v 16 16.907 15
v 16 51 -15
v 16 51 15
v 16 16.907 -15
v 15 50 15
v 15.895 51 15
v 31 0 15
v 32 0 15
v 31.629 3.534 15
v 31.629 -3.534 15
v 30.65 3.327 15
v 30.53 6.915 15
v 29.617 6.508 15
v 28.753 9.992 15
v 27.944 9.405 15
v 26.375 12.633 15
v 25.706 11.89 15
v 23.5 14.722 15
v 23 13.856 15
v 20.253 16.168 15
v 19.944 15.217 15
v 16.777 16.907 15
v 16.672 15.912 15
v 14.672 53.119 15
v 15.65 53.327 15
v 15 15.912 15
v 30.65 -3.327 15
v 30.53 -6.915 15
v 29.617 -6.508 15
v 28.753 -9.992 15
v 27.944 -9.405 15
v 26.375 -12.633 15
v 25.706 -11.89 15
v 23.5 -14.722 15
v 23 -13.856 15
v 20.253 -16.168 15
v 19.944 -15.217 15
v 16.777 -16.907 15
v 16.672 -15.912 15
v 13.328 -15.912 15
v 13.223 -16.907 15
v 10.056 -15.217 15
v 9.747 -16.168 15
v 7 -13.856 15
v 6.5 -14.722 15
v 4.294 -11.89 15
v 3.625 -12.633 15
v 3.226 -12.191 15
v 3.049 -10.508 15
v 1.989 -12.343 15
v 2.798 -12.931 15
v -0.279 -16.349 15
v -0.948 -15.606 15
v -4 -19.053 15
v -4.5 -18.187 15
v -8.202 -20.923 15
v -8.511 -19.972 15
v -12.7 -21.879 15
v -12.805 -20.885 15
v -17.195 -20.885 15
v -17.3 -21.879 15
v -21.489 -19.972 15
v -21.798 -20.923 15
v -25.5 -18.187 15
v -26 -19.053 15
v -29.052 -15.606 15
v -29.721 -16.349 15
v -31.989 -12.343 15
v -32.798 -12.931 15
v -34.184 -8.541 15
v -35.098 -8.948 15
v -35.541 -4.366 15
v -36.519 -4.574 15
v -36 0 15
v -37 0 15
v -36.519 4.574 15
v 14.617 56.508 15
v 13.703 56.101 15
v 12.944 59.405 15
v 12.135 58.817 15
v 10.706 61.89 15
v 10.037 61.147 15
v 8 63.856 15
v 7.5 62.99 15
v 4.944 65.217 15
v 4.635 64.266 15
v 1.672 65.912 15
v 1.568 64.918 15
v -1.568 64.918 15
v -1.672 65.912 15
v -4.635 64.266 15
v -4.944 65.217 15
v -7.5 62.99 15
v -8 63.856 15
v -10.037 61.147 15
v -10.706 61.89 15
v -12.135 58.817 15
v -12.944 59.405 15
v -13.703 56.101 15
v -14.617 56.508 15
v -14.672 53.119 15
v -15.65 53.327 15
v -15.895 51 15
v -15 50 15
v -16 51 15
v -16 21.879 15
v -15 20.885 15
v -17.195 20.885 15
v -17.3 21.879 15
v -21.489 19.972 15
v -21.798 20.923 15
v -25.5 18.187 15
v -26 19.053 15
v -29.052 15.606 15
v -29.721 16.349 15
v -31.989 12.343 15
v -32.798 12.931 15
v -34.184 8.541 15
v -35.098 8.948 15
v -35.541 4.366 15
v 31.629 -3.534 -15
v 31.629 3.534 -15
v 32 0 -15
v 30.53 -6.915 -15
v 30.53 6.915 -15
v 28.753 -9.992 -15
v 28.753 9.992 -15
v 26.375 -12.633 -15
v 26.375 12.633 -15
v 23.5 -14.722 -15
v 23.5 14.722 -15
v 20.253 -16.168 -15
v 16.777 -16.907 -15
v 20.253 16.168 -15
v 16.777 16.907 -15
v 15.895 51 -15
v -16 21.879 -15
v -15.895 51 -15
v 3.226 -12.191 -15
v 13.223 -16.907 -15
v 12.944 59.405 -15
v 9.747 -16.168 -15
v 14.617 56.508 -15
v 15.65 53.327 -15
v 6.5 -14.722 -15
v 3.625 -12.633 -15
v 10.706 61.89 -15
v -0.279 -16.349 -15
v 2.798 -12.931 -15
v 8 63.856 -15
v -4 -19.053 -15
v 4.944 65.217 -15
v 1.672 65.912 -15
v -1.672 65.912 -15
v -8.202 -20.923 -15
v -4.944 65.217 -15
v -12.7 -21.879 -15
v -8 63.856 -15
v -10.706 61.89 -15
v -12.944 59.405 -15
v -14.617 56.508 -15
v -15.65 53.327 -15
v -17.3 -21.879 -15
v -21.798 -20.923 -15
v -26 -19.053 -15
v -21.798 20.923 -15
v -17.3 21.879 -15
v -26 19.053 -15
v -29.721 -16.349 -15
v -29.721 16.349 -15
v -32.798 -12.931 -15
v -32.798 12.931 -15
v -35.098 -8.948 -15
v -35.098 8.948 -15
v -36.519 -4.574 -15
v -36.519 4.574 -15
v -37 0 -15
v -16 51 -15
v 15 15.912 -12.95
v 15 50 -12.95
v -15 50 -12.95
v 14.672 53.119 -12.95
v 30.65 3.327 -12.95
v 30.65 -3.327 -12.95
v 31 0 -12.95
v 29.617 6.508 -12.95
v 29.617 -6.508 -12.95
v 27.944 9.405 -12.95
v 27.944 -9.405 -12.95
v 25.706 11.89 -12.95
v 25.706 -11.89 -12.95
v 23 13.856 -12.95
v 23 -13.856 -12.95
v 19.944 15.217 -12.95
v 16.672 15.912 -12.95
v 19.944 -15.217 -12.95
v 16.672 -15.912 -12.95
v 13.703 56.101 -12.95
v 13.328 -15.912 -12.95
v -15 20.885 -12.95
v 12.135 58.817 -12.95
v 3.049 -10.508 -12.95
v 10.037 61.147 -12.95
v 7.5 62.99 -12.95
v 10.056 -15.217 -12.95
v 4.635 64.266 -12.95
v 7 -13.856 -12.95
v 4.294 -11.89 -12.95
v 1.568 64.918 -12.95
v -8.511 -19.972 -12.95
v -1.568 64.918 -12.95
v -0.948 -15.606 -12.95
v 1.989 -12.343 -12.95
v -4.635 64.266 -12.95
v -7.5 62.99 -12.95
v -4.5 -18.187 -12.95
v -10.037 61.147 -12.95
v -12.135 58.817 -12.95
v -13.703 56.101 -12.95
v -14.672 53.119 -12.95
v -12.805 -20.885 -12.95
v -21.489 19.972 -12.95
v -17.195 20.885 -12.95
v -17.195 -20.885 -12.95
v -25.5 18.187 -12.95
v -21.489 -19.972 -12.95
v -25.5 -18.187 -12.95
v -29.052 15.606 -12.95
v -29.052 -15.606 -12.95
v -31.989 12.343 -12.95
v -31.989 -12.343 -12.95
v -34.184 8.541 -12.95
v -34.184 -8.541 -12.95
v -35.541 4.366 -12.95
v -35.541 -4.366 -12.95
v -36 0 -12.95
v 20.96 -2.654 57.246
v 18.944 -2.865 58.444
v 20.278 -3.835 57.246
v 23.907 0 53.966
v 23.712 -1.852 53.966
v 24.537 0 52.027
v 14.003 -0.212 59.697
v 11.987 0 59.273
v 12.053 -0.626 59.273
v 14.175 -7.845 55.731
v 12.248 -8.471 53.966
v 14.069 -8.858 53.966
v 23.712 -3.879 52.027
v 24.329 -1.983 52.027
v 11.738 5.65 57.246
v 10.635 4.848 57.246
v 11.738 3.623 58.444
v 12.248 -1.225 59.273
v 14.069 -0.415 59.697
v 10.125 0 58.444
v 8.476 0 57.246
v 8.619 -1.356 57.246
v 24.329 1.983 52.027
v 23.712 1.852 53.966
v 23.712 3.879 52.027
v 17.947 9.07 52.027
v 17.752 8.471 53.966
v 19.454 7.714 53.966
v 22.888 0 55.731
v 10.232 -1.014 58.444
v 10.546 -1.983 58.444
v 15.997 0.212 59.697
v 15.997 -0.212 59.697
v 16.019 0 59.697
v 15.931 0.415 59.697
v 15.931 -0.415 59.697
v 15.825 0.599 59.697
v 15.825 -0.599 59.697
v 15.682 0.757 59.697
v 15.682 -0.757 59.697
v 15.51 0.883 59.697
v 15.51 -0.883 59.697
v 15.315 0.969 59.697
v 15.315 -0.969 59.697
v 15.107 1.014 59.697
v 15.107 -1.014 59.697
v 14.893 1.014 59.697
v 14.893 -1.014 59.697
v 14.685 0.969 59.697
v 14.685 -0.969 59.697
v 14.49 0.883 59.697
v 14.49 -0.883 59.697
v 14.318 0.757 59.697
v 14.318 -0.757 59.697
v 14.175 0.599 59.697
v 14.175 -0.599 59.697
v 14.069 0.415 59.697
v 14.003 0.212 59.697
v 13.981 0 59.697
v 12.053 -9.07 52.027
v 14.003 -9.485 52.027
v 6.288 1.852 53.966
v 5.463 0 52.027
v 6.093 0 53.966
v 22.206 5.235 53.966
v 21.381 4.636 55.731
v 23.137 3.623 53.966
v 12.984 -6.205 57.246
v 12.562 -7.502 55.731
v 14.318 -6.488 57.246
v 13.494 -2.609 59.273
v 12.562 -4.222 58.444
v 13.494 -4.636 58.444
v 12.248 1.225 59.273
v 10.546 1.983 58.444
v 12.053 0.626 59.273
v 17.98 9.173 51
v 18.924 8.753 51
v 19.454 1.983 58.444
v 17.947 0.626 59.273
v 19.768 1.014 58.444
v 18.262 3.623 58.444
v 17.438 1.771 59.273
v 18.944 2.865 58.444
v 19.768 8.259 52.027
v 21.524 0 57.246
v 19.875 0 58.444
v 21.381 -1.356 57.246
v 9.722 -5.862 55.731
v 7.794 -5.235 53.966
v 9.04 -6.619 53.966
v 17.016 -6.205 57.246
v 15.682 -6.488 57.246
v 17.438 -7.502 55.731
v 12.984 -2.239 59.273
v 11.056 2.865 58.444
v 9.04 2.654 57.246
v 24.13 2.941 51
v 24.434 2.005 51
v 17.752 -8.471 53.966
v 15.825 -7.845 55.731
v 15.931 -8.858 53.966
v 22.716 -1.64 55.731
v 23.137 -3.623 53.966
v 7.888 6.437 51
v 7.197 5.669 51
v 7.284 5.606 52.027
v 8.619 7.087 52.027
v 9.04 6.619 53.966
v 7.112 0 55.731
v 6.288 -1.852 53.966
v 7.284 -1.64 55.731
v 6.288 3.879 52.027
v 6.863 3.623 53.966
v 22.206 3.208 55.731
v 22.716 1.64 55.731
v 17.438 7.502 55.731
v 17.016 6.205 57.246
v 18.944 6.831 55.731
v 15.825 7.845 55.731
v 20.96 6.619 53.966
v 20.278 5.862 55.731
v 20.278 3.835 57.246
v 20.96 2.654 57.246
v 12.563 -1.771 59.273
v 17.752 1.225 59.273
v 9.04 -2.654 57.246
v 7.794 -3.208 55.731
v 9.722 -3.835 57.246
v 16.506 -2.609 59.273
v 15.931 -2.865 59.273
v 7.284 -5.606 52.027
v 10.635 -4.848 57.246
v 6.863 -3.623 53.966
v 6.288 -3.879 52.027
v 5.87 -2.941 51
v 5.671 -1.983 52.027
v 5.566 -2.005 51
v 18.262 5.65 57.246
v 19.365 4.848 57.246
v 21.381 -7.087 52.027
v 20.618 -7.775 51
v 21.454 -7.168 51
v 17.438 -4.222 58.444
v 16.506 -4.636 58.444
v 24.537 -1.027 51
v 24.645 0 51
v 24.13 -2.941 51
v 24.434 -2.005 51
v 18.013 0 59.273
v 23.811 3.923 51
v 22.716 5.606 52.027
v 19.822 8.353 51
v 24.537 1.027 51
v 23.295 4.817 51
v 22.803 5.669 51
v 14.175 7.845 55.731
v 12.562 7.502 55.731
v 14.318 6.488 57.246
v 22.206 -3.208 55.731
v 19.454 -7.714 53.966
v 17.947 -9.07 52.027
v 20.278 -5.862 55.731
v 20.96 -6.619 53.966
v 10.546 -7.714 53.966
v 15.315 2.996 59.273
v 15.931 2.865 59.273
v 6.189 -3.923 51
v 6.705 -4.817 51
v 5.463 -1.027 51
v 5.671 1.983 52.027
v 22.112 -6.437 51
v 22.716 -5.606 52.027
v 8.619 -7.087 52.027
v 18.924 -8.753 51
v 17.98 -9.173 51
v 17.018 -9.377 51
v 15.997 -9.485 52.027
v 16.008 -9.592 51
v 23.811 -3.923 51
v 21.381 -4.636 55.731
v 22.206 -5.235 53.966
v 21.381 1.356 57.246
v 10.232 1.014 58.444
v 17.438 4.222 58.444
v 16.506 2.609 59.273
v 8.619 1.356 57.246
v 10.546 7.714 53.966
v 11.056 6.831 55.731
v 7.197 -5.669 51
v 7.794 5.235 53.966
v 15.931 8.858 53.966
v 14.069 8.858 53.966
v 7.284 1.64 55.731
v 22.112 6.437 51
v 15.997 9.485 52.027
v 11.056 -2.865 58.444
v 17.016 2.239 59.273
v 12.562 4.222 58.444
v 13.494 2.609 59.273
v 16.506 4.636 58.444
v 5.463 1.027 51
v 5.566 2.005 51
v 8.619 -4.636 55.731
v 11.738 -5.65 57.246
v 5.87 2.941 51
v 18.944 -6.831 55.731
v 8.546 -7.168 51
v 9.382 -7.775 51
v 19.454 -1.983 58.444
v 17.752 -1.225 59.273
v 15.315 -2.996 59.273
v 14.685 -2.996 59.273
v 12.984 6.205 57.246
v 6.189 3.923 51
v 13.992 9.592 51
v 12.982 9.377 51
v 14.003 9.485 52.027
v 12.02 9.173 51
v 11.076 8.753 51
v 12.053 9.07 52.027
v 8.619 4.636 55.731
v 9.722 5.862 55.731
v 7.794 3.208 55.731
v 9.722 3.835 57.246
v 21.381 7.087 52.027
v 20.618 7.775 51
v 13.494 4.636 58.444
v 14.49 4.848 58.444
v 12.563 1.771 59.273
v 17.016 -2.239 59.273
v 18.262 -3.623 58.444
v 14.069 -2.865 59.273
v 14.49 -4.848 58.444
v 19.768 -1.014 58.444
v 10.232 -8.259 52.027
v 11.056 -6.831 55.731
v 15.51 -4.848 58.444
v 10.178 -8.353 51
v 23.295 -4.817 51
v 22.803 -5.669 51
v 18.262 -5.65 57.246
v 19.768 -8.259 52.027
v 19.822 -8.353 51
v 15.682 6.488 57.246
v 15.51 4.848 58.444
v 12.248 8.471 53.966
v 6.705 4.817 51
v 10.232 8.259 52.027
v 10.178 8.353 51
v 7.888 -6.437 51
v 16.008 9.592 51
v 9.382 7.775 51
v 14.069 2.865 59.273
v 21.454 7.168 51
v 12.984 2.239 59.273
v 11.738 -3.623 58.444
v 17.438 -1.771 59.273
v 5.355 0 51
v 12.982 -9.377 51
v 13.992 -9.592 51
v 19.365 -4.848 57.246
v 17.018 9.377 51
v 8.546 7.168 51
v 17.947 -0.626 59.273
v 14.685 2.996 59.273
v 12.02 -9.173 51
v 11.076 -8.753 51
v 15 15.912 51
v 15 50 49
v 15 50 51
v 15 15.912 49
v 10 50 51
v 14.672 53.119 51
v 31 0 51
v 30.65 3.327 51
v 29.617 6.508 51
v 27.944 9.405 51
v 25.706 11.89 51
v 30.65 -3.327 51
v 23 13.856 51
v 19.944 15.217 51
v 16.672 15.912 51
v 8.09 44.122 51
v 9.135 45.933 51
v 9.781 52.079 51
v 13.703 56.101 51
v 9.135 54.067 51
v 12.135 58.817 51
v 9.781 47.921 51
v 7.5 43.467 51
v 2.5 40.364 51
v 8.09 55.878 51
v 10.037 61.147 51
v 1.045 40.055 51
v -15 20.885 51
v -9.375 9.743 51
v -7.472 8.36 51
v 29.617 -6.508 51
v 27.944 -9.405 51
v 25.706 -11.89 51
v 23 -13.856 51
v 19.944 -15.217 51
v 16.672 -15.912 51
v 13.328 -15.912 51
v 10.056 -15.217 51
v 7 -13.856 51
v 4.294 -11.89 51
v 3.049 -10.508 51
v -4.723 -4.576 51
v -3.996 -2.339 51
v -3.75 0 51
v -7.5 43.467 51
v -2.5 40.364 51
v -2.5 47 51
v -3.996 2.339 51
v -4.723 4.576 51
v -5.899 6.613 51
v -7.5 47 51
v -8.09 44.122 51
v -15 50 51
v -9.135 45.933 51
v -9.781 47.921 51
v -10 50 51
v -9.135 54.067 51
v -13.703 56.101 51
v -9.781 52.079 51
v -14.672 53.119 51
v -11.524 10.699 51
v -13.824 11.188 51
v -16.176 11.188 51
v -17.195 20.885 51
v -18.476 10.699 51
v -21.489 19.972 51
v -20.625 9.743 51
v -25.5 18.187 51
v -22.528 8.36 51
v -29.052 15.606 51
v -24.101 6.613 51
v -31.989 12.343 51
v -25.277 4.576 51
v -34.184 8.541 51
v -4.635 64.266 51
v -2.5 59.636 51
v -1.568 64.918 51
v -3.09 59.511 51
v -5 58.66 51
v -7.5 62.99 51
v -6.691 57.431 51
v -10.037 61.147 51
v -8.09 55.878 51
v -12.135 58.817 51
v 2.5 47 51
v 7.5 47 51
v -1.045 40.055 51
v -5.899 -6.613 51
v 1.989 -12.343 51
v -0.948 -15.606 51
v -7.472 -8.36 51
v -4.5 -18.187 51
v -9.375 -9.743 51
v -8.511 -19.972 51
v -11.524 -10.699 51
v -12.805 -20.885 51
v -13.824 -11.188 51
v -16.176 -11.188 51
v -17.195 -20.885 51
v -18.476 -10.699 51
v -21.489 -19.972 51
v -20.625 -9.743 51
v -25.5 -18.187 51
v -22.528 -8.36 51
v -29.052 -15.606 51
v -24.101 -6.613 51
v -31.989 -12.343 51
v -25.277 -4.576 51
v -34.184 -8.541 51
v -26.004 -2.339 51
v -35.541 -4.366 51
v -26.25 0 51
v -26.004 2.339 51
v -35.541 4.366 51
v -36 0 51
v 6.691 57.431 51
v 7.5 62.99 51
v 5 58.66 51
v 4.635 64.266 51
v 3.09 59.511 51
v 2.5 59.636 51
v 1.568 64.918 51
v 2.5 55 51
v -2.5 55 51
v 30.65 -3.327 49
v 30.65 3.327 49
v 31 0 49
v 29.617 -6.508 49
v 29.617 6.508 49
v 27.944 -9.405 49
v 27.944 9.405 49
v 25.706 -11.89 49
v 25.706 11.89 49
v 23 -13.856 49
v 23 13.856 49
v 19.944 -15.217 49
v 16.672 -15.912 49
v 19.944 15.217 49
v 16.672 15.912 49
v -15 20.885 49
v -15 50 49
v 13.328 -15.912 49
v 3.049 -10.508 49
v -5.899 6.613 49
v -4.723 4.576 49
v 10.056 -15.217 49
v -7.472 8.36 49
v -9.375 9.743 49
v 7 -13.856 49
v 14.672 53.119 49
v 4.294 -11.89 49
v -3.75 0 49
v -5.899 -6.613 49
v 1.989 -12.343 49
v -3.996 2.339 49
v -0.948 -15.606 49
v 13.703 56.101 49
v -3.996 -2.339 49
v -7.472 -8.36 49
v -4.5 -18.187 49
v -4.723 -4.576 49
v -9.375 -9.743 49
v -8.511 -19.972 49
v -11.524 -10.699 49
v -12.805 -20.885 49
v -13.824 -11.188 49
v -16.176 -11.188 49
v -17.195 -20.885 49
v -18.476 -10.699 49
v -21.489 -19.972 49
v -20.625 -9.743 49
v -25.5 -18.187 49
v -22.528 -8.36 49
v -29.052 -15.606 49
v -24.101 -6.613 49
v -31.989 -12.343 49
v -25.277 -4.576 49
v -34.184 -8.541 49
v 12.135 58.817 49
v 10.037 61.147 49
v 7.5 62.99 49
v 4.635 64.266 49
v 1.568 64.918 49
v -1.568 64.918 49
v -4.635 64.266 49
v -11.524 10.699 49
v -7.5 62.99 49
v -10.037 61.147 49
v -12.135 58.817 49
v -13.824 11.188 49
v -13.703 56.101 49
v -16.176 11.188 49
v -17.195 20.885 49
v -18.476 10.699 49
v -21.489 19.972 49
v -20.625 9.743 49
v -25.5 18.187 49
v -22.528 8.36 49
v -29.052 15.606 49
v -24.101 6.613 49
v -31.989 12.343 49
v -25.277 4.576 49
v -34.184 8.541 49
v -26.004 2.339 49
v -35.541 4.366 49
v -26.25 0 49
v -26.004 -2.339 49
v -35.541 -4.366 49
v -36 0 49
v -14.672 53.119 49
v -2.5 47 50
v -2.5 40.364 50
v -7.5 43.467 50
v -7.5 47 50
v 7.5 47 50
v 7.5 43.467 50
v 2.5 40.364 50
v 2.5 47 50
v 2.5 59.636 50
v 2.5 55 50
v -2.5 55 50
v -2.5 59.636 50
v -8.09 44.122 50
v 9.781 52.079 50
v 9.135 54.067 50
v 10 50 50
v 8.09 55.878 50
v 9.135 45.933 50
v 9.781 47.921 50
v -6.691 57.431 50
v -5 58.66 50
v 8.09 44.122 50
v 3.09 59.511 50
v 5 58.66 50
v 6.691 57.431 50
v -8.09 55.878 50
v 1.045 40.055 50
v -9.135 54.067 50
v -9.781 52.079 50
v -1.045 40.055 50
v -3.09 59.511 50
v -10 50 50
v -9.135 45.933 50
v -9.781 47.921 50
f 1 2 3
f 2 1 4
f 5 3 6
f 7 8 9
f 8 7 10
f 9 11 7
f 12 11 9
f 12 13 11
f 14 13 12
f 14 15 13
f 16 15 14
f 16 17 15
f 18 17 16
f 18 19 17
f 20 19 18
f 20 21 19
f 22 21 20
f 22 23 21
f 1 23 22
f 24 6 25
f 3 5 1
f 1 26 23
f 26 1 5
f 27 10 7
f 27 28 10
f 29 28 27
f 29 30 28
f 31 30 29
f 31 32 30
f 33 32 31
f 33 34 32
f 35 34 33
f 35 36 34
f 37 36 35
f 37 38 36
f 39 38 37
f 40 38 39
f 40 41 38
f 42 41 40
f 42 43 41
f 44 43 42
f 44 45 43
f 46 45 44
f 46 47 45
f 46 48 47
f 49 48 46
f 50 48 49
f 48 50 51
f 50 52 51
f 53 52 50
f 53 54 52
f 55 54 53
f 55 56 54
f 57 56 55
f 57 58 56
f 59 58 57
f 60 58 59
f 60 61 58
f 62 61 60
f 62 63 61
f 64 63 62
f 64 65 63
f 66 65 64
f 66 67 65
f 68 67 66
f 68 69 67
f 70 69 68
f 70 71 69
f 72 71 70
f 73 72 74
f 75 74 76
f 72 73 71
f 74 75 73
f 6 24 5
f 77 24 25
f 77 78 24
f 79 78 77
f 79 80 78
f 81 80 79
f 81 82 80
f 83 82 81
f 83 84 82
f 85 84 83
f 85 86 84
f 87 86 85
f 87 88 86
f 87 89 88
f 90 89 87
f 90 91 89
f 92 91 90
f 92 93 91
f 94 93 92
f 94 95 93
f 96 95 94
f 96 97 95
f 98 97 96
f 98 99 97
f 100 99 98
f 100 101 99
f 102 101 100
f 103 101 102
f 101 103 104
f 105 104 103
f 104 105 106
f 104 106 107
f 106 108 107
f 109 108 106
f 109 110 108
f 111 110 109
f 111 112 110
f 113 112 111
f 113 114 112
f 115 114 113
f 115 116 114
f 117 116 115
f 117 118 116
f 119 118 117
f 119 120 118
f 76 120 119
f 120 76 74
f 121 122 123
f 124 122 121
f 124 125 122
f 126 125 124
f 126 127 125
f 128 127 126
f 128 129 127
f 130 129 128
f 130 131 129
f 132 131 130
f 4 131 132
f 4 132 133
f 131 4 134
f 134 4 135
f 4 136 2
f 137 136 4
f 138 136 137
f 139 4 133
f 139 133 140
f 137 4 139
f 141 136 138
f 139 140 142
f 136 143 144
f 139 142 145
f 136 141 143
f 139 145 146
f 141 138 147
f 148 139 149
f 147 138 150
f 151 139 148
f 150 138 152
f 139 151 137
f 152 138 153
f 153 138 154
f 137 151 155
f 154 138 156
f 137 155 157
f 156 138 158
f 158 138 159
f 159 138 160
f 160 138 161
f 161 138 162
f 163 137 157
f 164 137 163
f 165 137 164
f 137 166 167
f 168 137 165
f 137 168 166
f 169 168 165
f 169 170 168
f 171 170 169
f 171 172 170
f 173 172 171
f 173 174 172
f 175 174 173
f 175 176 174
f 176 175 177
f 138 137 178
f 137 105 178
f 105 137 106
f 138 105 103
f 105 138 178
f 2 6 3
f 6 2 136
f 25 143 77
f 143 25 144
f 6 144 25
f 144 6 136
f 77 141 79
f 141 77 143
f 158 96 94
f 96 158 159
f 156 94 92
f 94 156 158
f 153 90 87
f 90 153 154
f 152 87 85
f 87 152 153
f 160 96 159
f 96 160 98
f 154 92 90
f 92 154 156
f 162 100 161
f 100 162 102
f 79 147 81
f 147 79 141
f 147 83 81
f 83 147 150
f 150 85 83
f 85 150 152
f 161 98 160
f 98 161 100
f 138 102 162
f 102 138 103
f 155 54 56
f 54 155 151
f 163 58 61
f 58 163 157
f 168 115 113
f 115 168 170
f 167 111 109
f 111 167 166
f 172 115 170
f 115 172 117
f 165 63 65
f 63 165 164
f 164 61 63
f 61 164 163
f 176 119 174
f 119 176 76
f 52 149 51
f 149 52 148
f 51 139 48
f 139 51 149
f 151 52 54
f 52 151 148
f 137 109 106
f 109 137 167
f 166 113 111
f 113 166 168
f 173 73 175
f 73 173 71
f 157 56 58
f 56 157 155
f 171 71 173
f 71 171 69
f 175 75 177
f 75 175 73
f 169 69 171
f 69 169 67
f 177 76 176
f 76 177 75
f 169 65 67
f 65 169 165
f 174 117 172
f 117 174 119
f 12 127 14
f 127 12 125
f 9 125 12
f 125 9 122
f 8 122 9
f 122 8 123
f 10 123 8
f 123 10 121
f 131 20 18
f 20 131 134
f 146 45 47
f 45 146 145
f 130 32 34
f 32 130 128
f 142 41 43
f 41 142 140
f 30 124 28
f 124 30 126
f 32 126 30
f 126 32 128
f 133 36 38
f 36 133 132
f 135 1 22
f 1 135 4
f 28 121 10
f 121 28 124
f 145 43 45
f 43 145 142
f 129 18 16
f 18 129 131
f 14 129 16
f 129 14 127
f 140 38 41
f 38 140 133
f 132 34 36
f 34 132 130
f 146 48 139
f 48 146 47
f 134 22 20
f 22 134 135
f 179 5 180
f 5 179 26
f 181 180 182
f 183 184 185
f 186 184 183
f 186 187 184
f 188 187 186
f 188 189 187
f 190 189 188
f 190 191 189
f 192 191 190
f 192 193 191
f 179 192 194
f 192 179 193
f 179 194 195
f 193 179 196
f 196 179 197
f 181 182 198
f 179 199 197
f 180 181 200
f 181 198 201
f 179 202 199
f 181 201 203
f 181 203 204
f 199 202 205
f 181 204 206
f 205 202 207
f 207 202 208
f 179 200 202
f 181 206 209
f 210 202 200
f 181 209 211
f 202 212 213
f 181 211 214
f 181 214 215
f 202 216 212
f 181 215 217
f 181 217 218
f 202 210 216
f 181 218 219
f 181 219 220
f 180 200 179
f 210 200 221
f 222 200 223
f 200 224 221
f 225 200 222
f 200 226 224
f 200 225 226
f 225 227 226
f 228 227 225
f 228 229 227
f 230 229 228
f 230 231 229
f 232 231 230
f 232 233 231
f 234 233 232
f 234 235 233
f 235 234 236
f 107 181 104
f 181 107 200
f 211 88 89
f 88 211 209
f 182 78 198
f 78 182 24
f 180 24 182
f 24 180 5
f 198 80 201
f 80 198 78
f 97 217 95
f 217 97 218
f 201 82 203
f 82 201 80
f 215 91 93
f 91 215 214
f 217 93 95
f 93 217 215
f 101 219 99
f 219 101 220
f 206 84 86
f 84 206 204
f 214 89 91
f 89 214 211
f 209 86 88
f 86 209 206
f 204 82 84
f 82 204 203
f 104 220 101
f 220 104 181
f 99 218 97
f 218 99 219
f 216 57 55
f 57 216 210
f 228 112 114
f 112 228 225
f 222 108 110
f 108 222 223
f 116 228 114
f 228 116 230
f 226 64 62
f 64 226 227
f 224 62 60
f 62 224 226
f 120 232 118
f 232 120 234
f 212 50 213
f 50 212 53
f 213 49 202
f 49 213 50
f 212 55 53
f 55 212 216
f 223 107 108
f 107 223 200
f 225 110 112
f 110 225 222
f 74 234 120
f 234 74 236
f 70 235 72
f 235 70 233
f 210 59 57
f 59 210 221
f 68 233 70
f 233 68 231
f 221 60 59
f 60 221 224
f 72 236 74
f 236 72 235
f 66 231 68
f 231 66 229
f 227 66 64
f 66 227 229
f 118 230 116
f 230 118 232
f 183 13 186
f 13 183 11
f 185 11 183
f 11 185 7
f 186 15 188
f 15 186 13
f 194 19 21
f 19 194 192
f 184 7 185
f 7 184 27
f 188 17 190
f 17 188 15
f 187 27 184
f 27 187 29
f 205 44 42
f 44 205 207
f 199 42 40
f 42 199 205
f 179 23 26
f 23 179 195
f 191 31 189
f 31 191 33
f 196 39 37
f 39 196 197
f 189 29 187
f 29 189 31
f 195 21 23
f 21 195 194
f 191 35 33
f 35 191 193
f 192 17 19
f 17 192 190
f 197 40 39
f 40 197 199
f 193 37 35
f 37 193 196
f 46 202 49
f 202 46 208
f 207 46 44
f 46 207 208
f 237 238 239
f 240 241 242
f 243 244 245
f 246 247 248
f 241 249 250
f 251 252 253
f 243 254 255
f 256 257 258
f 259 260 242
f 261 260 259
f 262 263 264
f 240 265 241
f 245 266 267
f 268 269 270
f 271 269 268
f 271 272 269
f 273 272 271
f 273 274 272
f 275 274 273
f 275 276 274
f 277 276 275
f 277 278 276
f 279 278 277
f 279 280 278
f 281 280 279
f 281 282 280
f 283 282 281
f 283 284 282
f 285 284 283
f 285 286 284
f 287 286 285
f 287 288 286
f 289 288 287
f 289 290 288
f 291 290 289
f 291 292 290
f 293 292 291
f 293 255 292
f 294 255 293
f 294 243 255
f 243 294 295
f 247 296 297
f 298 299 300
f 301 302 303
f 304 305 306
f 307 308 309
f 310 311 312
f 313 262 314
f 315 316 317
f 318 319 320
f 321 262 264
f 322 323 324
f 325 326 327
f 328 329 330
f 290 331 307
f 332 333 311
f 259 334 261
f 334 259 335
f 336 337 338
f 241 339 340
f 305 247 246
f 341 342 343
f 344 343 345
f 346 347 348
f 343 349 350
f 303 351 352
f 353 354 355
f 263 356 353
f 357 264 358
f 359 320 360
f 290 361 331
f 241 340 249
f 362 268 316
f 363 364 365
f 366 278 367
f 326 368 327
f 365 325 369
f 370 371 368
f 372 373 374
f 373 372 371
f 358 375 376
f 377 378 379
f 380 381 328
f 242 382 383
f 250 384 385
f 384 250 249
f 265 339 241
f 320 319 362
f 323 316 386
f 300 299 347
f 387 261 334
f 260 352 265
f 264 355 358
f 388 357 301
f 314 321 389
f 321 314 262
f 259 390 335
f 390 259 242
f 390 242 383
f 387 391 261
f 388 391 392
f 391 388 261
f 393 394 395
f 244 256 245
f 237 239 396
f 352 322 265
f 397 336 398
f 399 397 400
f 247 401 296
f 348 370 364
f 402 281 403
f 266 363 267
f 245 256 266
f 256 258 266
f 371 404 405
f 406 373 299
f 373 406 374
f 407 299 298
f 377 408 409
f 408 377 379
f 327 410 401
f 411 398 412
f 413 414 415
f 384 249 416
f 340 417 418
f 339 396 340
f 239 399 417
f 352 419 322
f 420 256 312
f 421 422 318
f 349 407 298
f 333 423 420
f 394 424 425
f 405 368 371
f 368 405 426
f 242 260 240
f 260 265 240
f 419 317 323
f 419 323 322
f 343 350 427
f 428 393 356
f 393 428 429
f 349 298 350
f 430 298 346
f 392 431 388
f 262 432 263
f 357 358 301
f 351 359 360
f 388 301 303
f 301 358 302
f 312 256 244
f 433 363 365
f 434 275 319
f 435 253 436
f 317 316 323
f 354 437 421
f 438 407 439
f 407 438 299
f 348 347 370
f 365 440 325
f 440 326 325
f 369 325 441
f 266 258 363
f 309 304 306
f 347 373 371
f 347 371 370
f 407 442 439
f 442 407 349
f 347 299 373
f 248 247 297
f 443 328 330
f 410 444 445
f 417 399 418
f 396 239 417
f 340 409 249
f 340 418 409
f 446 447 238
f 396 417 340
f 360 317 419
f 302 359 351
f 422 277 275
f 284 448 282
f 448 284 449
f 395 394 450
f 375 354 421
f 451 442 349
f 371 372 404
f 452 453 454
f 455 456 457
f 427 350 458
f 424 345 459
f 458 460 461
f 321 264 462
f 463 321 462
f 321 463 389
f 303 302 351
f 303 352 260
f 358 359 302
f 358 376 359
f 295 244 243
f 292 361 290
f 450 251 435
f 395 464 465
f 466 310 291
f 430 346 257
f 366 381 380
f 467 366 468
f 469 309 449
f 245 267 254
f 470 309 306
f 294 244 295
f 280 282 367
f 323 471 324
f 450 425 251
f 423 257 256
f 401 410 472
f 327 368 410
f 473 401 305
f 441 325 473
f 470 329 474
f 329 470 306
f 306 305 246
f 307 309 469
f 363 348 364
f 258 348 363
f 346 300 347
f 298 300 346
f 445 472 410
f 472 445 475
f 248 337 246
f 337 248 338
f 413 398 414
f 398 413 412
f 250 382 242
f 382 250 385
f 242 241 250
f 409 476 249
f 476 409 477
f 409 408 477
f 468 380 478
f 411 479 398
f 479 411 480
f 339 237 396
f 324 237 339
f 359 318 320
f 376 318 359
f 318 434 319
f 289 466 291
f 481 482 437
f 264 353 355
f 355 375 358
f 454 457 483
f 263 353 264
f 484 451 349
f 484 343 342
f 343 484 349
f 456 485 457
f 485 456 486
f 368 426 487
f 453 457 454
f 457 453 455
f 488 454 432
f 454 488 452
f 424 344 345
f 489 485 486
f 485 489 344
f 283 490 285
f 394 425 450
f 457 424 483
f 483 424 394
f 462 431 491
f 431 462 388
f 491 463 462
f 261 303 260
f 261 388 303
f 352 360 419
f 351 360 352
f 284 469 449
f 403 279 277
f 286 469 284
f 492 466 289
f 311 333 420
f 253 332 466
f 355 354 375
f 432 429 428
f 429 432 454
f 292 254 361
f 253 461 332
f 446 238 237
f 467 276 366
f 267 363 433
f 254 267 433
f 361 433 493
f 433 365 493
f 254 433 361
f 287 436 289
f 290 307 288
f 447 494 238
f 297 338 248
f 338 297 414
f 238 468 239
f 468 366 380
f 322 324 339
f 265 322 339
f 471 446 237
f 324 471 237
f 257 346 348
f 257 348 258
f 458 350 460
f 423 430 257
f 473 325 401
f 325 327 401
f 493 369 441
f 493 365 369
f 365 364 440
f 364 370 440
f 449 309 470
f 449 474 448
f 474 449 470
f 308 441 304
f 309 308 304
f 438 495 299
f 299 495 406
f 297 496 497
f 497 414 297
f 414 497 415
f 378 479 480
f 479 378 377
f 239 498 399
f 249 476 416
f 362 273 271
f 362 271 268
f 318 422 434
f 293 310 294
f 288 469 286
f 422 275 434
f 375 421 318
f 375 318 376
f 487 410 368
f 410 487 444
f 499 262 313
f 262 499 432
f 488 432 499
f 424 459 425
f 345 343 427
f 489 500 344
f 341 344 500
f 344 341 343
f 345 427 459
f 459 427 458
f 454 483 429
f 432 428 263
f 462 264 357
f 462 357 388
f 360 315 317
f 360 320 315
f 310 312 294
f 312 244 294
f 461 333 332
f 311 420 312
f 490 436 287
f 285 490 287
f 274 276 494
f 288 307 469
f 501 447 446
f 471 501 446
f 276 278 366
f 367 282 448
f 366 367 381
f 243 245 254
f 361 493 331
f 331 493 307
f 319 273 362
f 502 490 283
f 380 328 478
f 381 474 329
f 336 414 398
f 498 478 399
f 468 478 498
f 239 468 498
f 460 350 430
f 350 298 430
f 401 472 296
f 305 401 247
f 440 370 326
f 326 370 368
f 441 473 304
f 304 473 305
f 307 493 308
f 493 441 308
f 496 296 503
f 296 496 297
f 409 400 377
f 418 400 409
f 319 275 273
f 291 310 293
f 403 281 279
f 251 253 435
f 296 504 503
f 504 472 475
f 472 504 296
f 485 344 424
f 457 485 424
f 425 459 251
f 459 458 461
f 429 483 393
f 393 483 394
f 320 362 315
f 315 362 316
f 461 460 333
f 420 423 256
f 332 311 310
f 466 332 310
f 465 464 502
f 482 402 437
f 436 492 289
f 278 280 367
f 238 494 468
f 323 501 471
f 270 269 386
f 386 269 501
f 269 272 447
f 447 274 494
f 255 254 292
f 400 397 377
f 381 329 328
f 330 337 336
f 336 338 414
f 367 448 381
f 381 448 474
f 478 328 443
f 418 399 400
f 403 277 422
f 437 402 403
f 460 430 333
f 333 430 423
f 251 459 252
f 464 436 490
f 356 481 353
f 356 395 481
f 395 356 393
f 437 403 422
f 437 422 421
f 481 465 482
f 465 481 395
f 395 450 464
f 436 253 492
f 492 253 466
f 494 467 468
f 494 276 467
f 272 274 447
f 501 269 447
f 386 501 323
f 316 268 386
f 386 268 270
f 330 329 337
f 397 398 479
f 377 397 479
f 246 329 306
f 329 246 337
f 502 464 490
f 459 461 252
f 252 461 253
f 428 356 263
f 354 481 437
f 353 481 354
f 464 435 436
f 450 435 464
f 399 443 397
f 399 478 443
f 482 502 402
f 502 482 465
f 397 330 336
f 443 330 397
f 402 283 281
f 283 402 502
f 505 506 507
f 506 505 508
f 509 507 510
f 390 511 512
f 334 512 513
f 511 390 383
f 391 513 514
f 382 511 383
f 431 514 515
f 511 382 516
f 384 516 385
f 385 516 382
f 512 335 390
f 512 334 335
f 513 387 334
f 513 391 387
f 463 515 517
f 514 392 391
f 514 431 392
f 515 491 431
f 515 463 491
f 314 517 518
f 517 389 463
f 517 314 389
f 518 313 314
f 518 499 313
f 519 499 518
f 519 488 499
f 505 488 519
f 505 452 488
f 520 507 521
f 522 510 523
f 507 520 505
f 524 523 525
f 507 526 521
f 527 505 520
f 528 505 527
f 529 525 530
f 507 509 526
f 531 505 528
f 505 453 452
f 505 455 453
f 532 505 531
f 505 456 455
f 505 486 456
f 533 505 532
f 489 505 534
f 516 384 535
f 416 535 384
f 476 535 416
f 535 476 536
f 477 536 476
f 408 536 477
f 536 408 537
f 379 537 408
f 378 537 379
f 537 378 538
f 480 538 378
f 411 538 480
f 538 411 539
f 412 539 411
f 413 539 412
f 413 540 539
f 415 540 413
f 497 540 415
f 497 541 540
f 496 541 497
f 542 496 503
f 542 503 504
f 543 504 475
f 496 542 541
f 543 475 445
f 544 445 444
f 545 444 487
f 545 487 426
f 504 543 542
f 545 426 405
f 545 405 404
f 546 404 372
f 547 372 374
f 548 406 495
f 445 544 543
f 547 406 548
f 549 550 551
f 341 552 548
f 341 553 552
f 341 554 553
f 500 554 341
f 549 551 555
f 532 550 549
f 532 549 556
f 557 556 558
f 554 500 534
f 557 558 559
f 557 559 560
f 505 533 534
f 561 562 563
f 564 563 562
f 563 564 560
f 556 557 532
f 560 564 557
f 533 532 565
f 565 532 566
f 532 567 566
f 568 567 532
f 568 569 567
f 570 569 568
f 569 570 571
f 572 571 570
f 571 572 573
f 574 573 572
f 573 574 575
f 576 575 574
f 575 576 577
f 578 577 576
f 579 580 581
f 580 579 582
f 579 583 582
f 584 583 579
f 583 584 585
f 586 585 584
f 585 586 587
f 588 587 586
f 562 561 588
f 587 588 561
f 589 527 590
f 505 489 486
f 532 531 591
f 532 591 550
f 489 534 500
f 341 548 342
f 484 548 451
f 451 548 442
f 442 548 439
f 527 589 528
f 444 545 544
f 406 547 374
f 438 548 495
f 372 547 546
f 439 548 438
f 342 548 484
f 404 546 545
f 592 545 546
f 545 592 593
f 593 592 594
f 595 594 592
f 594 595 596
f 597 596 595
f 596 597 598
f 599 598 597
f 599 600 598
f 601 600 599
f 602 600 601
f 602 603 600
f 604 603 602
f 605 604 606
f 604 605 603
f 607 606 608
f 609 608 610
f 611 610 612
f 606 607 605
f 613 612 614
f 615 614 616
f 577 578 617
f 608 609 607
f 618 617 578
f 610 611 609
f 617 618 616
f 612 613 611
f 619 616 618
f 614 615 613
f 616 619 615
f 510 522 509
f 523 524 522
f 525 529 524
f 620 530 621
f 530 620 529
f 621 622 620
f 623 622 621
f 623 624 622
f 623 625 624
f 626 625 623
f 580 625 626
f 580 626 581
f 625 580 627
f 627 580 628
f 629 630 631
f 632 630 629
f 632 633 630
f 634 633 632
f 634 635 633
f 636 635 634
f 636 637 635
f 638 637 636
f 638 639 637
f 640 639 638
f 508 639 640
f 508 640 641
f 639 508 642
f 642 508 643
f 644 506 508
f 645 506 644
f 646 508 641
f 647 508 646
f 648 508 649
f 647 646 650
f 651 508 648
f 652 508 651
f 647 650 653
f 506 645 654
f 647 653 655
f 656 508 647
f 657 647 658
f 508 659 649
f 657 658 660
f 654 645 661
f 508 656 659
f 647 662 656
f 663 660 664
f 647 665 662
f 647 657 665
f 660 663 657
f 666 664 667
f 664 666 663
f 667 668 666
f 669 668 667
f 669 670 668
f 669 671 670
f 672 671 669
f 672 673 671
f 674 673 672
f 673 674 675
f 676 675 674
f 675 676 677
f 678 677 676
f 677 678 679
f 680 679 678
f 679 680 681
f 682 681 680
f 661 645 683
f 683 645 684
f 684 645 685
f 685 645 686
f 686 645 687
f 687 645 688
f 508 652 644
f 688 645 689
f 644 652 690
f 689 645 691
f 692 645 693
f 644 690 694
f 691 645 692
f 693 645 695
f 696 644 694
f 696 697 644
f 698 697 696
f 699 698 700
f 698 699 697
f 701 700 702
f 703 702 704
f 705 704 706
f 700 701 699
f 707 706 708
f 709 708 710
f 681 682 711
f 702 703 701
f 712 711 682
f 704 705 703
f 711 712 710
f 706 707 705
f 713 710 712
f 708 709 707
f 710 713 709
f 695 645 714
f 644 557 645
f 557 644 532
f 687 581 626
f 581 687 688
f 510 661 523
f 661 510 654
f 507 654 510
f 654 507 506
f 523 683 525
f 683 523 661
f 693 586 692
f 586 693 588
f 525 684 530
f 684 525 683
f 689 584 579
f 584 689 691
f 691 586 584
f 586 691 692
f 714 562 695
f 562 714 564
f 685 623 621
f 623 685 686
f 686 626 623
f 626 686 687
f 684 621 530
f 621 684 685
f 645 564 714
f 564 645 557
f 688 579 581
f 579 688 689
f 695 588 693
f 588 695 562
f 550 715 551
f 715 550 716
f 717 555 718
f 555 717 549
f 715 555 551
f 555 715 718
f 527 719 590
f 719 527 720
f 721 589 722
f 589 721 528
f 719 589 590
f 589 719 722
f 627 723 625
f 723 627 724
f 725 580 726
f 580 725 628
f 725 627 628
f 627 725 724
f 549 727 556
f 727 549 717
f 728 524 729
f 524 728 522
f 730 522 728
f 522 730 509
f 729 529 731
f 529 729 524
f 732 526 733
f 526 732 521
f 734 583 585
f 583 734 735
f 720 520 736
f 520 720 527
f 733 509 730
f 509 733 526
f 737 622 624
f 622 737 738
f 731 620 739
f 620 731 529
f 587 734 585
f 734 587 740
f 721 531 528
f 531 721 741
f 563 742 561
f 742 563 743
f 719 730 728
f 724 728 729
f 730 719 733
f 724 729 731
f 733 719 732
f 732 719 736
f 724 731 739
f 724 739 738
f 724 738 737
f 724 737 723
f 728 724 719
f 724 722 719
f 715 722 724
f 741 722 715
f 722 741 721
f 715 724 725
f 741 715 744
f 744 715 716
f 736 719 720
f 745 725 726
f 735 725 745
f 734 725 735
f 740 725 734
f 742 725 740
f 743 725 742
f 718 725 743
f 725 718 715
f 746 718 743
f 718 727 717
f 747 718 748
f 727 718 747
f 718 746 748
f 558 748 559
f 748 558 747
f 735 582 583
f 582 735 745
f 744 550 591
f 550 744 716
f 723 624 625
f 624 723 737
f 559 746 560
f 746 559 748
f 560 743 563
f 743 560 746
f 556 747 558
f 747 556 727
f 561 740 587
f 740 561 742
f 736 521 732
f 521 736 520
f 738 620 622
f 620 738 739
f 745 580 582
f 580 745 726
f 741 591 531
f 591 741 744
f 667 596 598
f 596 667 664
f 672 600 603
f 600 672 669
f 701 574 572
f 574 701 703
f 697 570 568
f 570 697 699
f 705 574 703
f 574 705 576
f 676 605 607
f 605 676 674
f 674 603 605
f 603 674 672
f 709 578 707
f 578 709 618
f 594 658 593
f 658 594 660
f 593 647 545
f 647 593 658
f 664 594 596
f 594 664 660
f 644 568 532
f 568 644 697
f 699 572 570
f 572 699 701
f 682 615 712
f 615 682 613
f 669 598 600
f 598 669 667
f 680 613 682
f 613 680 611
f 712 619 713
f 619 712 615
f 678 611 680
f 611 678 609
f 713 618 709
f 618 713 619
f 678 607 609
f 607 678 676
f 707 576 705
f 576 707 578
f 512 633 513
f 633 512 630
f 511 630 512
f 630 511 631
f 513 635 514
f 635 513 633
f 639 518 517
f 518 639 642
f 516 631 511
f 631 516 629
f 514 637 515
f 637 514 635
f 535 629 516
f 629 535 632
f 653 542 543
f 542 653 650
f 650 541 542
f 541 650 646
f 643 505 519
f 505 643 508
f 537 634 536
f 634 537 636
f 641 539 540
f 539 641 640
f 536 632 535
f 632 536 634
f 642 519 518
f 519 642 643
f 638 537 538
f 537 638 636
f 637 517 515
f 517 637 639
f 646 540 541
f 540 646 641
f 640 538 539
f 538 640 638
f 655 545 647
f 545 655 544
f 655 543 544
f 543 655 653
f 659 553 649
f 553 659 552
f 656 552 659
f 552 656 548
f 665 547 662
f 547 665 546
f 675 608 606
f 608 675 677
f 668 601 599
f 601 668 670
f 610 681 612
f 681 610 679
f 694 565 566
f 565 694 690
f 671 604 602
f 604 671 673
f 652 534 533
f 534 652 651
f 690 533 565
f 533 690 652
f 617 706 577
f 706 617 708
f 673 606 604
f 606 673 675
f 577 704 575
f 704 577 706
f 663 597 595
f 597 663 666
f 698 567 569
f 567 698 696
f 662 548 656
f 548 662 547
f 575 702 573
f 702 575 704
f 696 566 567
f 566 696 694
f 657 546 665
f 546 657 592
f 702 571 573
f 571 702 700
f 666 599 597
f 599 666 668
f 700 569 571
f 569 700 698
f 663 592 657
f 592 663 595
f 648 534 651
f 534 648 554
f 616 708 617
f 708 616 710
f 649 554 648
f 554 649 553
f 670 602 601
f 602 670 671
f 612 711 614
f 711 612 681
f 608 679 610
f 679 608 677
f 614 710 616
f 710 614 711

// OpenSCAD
$fs=1;

ORB_D=22.5;
pirDiameter = ORB_D;

BOX_W=23.3;
BOARD_W=32.5;
BOARD_H=24.3;
MOUNT_SEP=29;

CLEARANCE=1;

ENCLOSURE_HEIGHT=25;
FRONT_THICK=4;
BOX_DEPTH=2;

OVERSIZE = 20;

STAKE_LENGTH=40;

faceMain();
translate([0,0,50])
    facePlate();

// Inter pupilllary distance
IPD = 30;

// For preventing z-fighting
epsilon = 0.1;

// Thickness of all walls
thickness = 2;

// This has to be enough to accomodate the PIR PCB
occipitalDiameterA = 42;
occipitalDiameterB = 42 - 10;

// Fake eye
eyeDiameter = pirDiameter - 3;

// Depth of the face - needs to be deep enough for a nano and PIR(21mm)
faceDepth = 30;

// The lower part of the face
jawWidth = 30;

// The jaw needs to be tall enough for a nano + a buck converter (43mm each)
jawDepth = 60;

// How far down the face is the jaw?
jawOffset = 40;

// Size of the mouth
mouthSize = 20;

module faceMain() {
    difference () {
        union () {
            translate([-IPD / 2, 0, 0])
                cylinder(h=faceDepth, d=occipitalDiameterA + thickness, center=true);
            translate([IPD / 2, 0, 0])
                cylinder(h=faceDepth, d=occipitalDiameterB + thickness, center=true);

            translate([0, jawDepth - jawOffset, 0]) {
                cube([jawWidth + thickness, jawDepth + thickness, faceDepth], center=true);
                translate([0, jawDepth / 2, 0]) {
                    cylinder(h=faceDepth, d=jawWidth + thickness, center=true);
                }
            }
        }
        
        union () {
            translate([0, 0, thickness + epsilon]) {
                translate([-IPD / 2, 0, 0])
                    cylinder(h=faceDepth + epsilon, d=occipitalDiameterA, center=true);
                translate([IPD / 2, 0, 0])
                    cylinder(h=faceDepth + epsilon, d=occipitalDiameterB, center=true);

                translate([0, jawDepth - jawOffset, 0]) {
                    cube([jawWidth, jawDepth, faceDepth + epsilon], center=true);
                    translate([0, jawDepth / 2, 0]) {
                        cylinder(h=faceDepth + epsilon, d=jawWidth, center=true);
                    }
                }
            }
        }
    }
}

module facePlate() {
    union () {
        // Fake eye
        translate([IPD / 2, 0, 0]) {
            difference() {
                sphere(d=eyeDiameter, center=true);
                translate([0, 0, -eyeDiameter / 2])
                    cube([eyeDiameter, eyeDiameter, eyeDiameter], center = true);
            }
        }
        
        // Occipital
        difference () {
            union () {
                translate([-IPD / 2, 0, 0])
                    cylinder(h=thickness, d=occipitalDiameterA, center=true);
                translate([IPD / 2, 0, 0])
                    cylinder(h=thickness, d=occipitalDiameterB, center=true);

                // Jaw
                translate([0, jawDepth - jawOffset, 0]) {
                    difference() {
                        union () {
                            cube([jawWidth, jawDepth, thickness], center=true);
                            translate([0, jawDepth / 2, 0])
                                cylinder(h=thickness, d=jawWidth, center=true);
                        }

                        translate([0, jawDepth / 2, thickness / 2]) {
                            difference () {
                                cylinder(h=thickness, d=mouthSize, center=true);

                                union () {
                                    translate([-5, -8, 0])
                                        cube([5, 10, thickness + epsilon], center = true);
                                    translate([5, -8, 0])
                                        cube([5, 10, thickness + epsilon], center = true);
                                    translate([0, 10, 0])
                                        cube([5, 10, thickness + epsilon], center = true);
                                }
                            }
                        }                            
                    }
                }
            }

            translate([-IPD / 2, 0, 0])
                cylinder(h=thickness + epsilon, d=ORB_D, center=true);
        }
        
    }
}

/*    
    translate([0,-(STAKE_LENGTH/2)-(BOARD_H+5)/2,-ENCLOSURE_HEIGHT/2+1.5])

    union() {
        cube([6,STAKE_LENGTH,3], center=true);
        translate([0,-STAKE_LENGTH/2,0])
        scale([1,3,1])
        rotate([0,0,45])
            cube([6/1.414,6/1.414,3], center=true);
    }
    */

    

module lid() {
    union() {
        roundedCube(BOARD_W+OVERSIZE+5, BOARD_H+5, 2, 5);
        translate([0,0,-2.5])
            difference() {
                cube([BOARD_W+OVERSIZE+1.5, BOARD_H+1.5, 3], center=true);
                translate([-BOARD_W / 2,BOARD_H*0,0])
                    cube([BOARD_H,5,3.5], center=true);
            }

    }
}

module roundedCube(x, y, z, rounding) {
    
    cylX = (x-rounding)/2;
    cylY = (y-rounding)/2;
    
    union() {
        cube([x-rounding, y, z], center=true);
        cube([x, y-rounding, z], center=true);
        
        for(a=[-cylX, cylX])
            for(b=[-cylY, cylY])
                translate([a,b,0])
                    cylinder(d=rounding,h=z, center=true);
        }
    }
